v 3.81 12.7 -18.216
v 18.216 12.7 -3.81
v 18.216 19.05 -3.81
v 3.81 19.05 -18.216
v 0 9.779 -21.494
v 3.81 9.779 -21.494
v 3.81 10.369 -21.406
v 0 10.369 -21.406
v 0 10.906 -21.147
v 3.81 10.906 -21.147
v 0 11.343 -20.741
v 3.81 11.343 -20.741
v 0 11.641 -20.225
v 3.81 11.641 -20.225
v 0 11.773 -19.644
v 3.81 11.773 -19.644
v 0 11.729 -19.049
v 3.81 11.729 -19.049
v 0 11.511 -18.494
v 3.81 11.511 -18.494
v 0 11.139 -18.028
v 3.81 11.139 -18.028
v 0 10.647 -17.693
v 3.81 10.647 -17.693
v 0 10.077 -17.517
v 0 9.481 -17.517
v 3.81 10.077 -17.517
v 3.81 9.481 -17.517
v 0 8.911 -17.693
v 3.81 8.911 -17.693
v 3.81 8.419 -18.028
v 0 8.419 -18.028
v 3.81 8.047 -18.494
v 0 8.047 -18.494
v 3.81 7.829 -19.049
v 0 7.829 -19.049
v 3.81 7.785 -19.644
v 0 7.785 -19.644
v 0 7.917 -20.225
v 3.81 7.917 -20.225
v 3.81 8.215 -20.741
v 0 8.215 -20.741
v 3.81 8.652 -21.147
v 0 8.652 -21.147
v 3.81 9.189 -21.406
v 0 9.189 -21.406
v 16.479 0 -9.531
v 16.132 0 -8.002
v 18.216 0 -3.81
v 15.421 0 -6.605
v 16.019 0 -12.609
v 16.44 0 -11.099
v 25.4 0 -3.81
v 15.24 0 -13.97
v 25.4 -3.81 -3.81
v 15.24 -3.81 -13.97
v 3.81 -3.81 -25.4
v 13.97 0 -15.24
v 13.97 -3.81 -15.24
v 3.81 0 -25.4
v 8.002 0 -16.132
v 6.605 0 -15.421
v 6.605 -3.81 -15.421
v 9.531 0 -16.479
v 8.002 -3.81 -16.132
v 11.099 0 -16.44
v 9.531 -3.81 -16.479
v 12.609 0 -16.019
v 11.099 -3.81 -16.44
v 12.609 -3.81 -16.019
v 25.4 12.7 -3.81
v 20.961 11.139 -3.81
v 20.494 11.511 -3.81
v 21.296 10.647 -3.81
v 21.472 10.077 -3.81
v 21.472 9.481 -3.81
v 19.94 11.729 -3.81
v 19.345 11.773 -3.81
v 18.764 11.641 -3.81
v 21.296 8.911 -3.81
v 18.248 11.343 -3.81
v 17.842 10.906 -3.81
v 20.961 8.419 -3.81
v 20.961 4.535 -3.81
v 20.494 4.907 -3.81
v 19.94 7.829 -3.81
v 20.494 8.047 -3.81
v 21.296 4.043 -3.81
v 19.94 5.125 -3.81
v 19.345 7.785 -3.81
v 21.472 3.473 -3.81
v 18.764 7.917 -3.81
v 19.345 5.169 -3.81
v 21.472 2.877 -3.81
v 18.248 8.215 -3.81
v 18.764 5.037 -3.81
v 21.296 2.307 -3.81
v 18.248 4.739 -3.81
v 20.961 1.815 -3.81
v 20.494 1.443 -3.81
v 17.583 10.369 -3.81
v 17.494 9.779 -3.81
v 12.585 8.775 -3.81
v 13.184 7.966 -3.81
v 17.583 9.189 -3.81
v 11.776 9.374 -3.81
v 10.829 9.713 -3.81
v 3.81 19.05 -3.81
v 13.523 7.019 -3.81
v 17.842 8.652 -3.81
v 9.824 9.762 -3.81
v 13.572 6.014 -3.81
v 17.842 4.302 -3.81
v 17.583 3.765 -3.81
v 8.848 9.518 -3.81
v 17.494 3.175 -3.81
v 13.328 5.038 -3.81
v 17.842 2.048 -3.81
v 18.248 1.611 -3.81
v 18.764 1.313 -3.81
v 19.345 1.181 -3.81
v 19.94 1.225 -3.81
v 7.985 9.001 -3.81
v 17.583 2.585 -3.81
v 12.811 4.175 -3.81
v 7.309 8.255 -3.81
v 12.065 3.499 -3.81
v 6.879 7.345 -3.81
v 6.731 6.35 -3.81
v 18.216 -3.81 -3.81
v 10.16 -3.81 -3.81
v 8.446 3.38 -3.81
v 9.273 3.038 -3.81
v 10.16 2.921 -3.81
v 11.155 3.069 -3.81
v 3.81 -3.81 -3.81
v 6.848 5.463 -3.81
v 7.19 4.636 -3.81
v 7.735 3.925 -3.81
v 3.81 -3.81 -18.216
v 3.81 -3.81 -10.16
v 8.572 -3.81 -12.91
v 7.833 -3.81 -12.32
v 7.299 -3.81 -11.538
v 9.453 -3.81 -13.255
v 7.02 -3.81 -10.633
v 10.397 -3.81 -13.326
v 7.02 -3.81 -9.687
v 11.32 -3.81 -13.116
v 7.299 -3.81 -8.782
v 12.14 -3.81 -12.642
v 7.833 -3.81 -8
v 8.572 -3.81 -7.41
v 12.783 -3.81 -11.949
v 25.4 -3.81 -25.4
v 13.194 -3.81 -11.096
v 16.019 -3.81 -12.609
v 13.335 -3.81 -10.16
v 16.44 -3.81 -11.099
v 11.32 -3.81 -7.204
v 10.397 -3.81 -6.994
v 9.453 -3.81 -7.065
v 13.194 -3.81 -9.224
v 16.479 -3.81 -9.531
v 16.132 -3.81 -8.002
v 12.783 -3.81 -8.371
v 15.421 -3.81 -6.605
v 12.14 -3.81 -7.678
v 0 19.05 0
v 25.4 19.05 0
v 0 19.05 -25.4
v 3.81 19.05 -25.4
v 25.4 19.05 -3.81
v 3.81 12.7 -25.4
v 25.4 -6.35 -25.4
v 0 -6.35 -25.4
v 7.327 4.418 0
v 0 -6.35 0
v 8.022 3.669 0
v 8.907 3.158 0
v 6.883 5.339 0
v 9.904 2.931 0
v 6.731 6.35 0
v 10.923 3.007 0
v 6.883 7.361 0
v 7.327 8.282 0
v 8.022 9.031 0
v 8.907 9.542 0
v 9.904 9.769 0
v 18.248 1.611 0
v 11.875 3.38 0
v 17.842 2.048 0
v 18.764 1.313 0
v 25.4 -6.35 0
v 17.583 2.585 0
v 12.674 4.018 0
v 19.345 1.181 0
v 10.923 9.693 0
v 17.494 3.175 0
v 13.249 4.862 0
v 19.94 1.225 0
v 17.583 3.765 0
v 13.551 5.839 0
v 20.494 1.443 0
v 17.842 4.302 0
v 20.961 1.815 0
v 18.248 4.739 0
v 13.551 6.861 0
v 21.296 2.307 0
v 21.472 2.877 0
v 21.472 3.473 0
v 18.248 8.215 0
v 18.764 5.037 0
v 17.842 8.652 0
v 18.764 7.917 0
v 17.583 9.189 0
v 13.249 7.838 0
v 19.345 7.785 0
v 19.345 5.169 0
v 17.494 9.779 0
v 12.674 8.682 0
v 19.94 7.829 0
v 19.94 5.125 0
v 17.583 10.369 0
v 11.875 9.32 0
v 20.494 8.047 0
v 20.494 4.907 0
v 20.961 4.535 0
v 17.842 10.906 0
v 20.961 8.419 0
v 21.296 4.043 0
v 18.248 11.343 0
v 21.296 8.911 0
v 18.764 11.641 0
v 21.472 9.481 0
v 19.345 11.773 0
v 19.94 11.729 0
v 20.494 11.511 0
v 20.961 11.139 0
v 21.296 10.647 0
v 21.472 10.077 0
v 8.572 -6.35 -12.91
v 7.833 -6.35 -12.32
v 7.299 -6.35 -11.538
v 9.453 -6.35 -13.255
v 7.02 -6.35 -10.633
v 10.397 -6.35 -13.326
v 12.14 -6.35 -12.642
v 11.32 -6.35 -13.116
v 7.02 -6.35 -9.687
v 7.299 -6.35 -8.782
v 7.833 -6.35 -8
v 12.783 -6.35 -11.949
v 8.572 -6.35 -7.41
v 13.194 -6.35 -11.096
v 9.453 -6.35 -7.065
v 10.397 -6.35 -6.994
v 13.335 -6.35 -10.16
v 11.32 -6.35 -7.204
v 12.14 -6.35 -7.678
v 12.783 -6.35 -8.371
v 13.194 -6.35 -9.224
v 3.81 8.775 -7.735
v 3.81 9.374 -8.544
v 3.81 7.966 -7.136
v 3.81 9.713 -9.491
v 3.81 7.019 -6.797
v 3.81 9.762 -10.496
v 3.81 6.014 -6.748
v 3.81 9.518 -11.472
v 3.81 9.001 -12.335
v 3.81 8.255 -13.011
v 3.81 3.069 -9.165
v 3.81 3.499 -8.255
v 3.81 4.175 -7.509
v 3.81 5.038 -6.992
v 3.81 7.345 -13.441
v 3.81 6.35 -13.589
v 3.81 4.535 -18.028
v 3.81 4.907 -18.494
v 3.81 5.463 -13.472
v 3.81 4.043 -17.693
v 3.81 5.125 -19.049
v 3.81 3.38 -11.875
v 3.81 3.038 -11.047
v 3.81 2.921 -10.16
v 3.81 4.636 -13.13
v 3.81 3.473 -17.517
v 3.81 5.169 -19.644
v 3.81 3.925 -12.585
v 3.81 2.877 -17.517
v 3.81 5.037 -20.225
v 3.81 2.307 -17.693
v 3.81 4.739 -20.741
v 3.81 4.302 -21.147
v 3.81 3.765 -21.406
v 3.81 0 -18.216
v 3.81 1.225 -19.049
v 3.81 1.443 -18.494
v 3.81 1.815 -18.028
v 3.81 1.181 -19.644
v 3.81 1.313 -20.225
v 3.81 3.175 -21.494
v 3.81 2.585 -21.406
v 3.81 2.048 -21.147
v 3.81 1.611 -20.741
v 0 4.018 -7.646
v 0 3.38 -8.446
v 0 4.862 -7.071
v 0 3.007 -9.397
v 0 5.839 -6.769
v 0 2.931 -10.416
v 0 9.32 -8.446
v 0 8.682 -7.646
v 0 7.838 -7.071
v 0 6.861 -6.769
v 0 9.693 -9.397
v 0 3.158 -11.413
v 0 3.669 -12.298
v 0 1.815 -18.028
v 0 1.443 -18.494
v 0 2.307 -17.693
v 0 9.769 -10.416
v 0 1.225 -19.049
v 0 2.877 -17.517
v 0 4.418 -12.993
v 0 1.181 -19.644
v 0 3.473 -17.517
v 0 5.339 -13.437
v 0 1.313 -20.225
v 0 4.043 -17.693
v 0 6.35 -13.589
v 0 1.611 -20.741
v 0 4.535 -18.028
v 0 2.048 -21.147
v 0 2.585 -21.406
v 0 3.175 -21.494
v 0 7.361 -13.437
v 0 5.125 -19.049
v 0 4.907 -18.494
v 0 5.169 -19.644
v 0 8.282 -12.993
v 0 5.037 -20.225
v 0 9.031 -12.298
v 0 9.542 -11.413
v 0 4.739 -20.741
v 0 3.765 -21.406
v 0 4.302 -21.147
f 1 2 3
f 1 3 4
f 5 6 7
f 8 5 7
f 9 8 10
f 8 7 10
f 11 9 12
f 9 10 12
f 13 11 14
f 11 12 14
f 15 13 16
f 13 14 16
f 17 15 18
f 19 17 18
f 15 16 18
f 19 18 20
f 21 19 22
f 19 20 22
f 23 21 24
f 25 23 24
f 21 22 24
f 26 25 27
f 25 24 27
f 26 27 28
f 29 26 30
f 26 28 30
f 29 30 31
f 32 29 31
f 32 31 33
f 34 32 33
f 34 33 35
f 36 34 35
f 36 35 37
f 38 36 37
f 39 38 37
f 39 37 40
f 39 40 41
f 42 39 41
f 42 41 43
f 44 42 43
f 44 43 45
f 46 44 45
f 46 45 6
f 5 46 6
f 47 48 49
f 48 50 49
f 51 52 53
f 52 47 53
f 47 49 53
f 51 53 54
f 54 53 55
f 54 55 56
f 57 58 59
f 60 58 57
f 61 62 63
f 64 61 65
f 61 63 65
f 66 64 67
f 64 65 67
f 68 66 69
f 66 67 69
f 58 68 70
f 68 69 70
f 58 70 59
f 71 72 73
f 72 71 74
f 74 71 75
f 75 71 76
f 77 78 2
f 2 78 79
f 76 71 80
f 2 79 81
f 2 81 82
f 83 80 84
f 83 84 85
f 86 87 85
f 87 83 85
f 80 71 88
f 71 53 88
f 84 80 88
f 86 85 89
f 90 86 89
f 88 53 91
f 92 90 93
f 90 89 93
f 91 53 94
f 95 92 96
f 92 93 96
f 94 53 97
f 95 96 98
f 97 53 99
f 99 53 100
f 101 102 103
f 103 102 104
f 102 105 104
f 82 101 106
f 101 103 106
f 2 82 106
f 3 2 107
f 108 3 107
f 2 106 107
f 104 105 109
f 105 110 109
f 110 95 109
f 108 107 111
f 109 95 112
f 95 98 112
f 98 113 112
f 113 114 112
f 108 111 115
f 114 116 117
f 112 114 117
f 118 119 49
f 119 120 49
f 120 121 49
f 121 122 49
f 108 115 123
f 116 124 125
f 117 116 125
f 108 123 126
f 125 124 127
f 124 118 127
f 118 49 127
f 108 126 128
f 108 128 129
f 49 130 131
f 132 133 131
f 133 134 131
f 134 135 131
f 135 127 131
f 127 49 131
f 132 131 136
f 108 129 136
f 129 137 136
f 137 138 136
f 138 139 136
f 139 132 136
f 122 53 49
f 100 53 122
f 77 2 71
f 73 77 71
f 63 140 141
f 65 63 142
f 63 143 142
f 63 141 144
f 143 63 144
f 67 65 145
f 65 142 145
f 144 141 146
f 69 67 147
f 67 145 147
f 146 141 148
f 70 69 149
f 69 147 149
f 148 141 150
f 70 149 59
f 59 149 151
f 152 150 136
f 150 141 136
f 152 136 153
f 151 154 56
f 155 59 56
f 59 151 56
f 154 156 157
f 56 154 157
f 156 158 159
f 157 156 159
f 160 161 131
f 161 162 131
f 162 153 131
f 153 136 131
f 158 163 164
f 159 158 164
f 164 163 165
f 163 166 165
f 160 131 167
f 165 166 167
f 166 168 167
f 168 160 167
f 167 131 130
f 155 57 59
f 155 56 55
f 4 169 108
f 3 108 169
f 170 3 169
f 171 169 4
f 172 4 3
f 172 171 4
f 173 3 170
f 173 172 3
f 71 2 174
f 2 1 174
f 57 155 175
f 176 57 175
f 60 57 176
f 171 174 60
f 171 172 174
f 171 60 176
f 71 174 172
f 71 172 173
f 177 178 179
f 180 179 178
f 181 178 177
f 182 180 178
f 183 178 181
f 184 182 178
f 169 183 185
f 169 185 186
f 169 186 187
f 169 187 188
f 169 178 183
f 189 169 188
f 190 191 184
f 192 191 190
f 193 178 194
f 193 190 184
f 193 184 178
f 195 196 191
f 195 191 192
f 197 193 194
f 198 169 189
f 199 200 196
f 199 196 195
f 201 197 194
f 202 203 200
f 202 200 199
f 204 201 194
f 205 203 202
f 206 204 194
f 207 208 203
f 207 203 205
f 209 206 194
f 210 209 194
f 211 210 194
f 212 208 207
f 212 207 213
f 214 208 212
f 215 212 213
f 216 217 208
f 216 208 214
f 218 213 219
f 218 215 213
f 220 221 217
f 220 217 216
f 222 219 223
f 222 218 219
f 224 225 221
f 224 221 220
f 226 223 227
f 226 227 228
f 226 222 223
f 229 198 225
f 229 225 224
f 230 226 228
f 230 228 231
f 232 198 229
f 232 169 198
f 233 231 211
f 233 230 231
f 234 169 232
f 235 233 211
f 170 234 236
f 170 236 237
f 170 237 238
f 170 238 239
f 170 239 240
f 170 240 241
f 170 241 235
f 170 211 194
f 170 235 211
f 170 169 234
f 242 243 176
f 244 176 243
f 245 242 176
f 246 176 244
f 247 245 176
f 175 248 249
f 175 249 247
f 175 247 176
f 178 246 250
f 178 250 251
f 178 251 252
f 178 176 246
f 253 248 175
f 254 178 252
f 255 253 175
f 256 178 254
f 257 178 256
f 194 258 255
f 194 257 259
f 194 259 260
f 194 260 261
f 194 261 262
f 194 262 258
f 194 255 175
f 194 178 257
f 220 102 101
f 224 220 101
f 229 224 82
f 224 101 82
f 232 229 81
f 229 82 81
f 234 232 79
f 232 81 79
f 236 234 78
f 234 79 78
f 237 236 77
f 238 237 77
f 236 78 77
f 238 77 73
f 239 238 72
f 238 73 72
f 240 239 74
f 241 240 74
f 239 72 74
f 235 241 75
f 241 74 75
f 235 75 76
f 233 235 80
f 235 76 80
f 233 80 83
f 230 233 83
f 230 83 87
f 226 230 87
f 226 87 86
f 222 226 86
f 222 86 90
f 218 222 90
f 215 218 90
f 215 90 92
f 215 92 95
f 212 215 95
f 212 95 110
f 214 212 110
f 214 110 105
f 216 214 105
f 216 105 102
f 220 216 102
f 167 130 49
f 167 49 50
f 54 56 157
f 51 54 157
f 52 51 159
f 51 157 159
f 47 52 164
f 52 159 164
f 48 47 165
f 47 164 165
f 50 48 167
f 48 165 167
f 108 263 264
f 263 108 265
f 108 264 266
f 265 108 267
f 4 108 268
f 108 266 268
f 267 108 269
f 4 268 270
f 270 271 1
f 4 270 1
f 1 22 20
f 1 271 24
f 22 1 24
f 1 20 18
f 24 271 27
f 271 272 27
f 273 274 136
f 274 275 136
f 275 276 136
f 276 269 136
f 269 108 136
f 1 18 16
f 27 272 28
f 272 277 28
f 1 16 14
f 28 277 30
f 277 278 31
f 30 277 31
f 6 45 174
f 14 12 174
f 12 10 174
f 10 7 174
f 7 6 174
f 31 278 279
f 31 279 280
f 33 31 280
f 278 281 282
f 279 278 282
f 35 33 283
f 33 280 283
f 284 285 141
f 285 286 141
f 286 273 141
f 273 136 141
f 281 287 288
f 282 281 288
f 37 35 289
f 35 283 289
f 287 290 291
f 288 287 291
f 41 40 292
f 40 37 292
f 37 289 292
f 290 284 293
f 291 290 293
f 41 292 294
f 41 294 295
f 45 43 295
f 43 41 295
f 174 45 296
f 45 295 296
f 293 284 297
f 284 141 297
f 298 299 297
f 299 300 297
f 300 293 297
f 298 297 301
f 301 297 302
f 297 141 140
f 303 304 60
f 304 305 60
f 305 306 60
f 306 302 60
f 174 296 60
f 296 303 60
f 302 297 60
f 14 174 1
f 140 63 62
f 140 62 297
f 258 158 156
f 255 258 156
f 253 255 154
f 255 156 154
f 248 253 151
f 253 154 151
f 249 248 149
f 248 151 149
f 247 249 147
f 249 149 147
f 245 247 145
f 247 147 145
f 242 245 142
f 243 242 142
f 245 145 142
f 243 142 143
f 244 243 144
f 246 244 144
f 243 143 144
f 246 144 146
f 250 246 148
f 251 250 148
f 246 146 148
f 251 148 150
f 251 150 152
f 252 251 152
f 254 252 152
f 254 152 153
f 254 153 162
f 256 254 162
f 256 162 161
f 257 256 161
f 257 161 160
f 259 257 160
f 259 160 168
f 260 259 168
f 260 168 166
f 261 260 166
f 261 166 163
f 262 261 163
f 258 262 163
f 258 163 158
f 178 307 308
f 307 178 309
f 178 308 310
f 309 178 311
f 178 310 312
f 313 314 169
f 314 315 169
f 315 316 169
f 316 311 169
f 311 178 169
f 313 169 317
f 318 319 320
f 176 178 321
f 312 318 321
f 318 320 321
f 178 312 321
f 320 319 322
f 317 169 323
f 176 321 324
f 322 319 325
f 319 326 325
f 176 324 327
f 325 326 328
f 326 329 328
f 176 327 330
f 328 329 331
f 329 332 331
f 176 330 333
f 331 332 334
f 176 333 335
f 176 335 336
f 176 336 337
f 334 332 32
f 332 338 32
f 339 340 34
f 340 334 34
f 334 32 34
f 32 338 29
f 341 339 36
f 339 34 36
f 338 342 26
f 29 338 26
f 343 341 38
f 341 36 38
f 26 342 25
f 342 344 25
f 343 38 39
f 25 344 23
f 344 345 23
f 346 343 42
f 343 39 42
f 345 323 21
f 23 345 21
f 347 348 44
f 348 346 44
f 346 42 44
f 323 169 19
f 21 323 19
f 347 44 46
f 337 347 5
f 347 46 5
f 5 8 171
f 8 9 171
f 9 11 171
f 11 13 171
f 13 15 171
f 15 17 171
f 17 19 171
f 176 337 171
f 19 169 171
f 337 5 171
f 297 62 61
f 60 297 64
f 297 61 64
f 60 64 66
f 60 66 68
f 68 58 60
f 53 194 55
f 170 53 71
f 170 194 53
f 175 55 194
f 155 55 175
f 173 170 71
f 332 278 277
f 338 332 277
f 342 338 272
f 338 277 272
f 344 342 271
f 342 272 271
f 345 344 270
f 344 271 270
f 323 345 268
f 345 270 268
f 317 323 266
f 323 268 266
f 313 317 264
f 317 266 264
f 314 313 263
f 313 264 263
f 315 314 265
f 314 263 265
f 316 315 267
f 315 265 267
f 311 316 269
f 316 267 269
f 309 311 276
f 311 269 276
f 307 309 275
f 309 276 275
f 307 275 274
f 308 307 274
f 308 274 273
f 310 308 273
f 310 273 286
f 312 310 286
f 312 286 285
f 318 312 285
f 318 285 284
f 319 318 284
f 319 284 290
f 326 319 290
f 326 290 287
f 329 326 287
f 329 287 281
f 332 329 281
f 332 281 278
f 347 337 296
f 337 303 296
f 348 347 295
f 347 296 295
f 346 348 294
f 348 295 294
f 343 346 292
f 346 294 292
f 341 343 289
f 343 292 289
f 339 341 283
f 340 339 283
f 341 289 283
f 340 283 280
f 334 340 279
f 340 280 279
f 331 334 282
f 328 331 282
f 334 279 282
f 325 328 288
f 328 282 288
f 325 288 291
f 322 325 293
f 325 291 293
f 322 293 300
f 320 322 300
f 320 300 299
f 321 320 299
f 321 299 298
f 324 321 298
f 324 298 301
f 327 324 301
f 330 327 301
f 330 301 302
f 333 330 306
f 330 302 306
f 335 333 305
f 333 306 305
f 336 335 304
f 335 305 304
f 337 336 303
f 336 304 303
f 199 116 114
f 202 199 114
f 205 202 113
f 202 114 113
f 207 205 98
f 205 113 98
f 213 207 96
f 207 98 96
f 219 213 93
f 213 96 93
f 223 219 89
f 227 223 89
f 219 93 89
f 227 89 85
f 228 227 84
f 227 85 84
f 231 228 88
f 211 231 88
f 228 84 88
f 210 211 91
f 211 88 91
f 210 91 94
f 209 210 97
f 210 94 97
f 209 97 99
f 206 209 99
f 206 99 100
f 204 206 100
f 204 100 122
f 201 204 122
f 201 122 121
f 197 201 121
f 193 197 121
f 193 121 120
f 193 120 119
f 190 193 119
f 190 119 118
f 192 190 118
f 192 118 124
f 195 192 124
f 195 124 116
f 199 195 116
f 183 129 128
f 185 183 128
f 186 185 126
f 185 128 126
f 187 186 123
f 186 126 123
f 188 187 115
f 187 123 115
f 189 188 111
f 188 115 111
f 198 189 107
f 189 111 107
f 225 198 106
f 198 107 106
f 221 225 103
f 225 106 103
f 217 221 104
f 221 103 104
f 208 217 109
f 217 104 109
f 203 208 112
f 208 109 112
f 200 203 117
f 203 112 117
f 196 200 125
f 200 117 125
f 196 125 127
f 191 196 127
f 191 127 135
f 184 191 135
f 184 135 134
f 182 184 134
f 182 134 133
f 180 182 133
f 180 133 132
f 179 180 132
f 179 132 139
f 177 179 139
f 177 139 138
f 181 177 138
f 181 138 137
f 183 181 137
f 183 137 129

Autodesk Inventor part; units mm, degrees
ref_plane "YZ Plane" through (0, 0, 0) normal (1, 0, 0) x (0, 1, 0)
ref_plane "XZ Plane" through (0, 0, 0) normal (0, 1, 0) x (-1, 0, 0)
ref_plane "XY Plane" through (0, 0, 0) normal (0, 0, 1) x (1, 0, 0)
sketch "Sketch1" plane through (0, 0, 0) normal (0, 1, 0) x (-1, 0, 0)
  line L0 (0, 0) -> (-25.4, 0)
  line L1 (-25.4, 0) -> (-25.4, -3.81)
  line L2 (-25.4, -3.81) -> (0, -3.81)
  line L3 (0, -3.81) -> (0, 0)
  line L4 (0, 0) -> (-3.81, 0)
  line L5 (-3.81, 0) -> (-3.81, -25.4)
  line L6 (-3.81, -25.4) -> (0, -25.4)
  line L7 (0, -25.4) -> (0, 0)
  point P0 (-3.81, -3.81)
  dimension "d0" = 25.4
  dimension "d1" = 3.81
  dimension "d2" = 3.81
  dimension "d3" = 25.4
extrude "Extrusion1" add sketch "Sketch1" along normal blind 12.7
sketch "Sketch2" plane through (0, 12.7, 0) normal (0, 1, 0) x (1, 0, 0)
  line L0 (3.81, 3.81) -> (3.81, 25.4) projected
  line L1 (25.4, 3.81) -> (3.81, 3.81) projected
  line L2 (3.81, 25.4) -> (25.4, 3.81)
  line L3 (0, 0) -> (25.4, 0) projected
  line L4 (25.4, 3.81) -> (25.4, 0)
  line L5 (0, 25.4) -> (0, 0) projected
  line L6 (25.4, 0) -> (0, 0)
  line L7 (0, 0) -> (0, 25.4)
  line L8 (0, 25.4) -> (3.81, 25.4)
extrude "Extrusion2" add sketch "Sketch2" along normal blind 6.35
sketch "Sketch3" plane through (0, 0, 0) normal (0, -1, 0) x (1, 0, 0)
  line L0 (3.81, -25.4) -> (0, -25.4) projected
  line L1 (0, -25.4) -> (3.81, -25.4)
  line L2 (25.4, -3.81) -> (3.81, -25.4) projected
  line L3 (3.81, -25.4) -> (25.4, -3.81)
  line L4 (25.4, 0) -> (25.4, -3.81) projected
  line L5 (25.4, -3.81) -> (25.4, 0)
  line L6 (0, 0) -> (25.4, 0) projected
  line L7 (25.4, 0) -> (0, 0)
  line L8 (0, 0) -> (0, -25.4)
extrude "Extrusion3" add sketch "Sketch3" along normal blind 6.35
sketch "Sketch4" plane through (0, 12.7, 0) normal (0, -1, 0) x (1, 0, 0)
  line L0 (3.81, -25.4) -> (25.4, -3.81) projected
  line L1 (15.875, -13.335) -> (12.2829, -9.7429)
  line L2 (12.2829, -9.7429) -> (3.81, -18.2158)
  line L3 (3.81, -3.81) -> (3.81, -25.4) projected
  line L4 (25.4, -3.81) -> (3.81, -3.81) projected
  line L5 (3.81, -18.2158) -> (3.81, -3.81)
  line L6 (3.81, -3.81) -> (18.2158, -3.81)
  line L7 (12.2829, -9.7429) -> (18.2158, -3.81)
  dimension "d10" = 5.08
extrude "Extrusion4" cut sketch "Sketch4" against normal mid plane 50.8 contours L3 L4 L7 L2
sketch "Sketch5" plane through (3.81, -6.35, -3.81) normal (1, 0, 0) x (0, 0, -1)
  line L0 (0, 6.35) -> (0, 19.05) projected
  line L1 (0, 12.7) -> (21.59, 12.7)
  line L2 (21.59, 6.35) -> (21.59, 19.05) projected
  circle A0 centre (6.35, 12.7) radius 3.429
  circle A1 centre (15.6845, 16.129) radius 2
  circle A2 centre (15.6845, 9.525) radius 2
  line L3 (9.779, 12.7) -> (21.59, 12.7)
  line L4 (15.6845, 12.7) -> (15.6845, 6.35)
  line L5 (14.4058, 6.35) -> (21.59, 6.35) projected
  line L6 (15.6845, 12.7) -> (15.6845, 19.05)
  line L7 (14.4058, 19.05) -> (21.59, 19.05) projected
  circle A3 centre (6.35, 12.9362) radius 6.35
  dimension "d13" = 6.858
  dimension "d16" = 4
  dimension "d17" = 4
  dimension "d18" = 12.7
extrude "Extrusion5" cut sketch "Sketch5" against normal blind 12.7 contours A0 L1 | L1 A0 | L4 A2 | A2 L4 | L6 A1 | A1 L6
sketch "Sketch6" plane through (3.81, -6.35, -3.81) normal (0, 0, -1) x (-1, 0, 0)
  line L0 (0, 6.35) -> (0, 19.05)
  line L1 (0, 12.7) -> (21.59, 12.7)
  line L2 (21.59, 6.35) -> (21.59, 19.05)
  circle A0 centre (6.35, 12.7) radius 3.429
  circle A1 centre (15.6845, 16.129) radius 2
  circle A2 centre (15.6845, 9.525) radius 2
  line L3 (9.779, 12.7) -> (21.59, 12.7)
  line L4 (15.6845, 12.7) -> (15.6845, 6.35)
  line L5 (14.4058, 6.35) -> (21.59, 6.35)
  line L6 (15.6845, 12.7) -> (15.6845, 19.05)
  line L7 (14.4058, 19.05) -> (21.59, 19.05)
  circle A3 centre (6.35, 12.9362) radius 6.35
  line L8 (-15.6845, 12.7) -> (-15.6845, 6.35)
  circle A4 centre (-15.6845, 9.525) radius 2
  line L9 (-15.6845, 12.7) -> (-15.6845, 19.05)
  line L10 (-9.779, 12.7) -> (-21.59, 12.7)
  circle A5 centre (-15.6845, 16.129) radius 2
  line L11 (-14.4058, 6.35) -> (-21.59, 6.35)
  line L12 (-21.59, 6.35) -> (-21.59, 19.05)
  line L13 (-14.4058, 19.05) -> (-21.59, 19.05)
  line L14 (0, 12.7) -> (-21.59, 12.7)
  circle A6 centre (-6.35, 12.7) radius 3.429
  circle A7 centre (-6.35, 12.9362) radius 6.35
  dimension "d19" = 6.858
  dimension "d20" = 4
  dimension "d21" = 4
  dimension "d22" = 12.7
extrude "Extrusion6" cut sketch "Sketch6" against normal blind 12.7 contours A6 L14 | L14 A6 | A4 L8 | L8 A4 | A5 L9 | L9 A5
sketch "Sketch7" plane through (0, -6.35, 0) normal (0, -1, 0) x (1, 0, 0)
  line L0 (25.4, 0) -> (0, 0) projected
  line L1 (0, 0) -> (25.4, 0)
  line L2 (25.4, 0) -> (25.4, -25.4)
  line L3 (25.4, -25.4) -> (0, -25.4)
  line L4 (0, -25.4) -> (0, 0)
  dimension "d25" = 25.4
  dimension "d26" = 25.4
extrude "Extrusion7" add sketch "Sketch7" against normal blind 2.54
sketch "Sketch8" plane through (0, -3.81, 0) normal (0, 1, 0) x (1, 0, 0)
  circle A0 centre (10.16, 10.16) radius 6.35
  circle A1 centre (10.16, 10.16) radius 3.175
  line L0 (18.2158, 3.81) -> (3.81, 3.81) projected
  line L1 (3.81, 3.81) -> (3.81, 18.2158) projected
  dimension "d29" = 12.7
  dimension "d30" = 6.35
extrude "Extrusion8" cut sketch "Sketch8" against normal mid plane 10.16 contours A1
extrude "Extrusion9" cut sketch "Sketch8" along normal blind 10.16 contours A0
equation "\"d2\" = d1"
properties part number "panel connector" material "PC/ABS Plastic"
